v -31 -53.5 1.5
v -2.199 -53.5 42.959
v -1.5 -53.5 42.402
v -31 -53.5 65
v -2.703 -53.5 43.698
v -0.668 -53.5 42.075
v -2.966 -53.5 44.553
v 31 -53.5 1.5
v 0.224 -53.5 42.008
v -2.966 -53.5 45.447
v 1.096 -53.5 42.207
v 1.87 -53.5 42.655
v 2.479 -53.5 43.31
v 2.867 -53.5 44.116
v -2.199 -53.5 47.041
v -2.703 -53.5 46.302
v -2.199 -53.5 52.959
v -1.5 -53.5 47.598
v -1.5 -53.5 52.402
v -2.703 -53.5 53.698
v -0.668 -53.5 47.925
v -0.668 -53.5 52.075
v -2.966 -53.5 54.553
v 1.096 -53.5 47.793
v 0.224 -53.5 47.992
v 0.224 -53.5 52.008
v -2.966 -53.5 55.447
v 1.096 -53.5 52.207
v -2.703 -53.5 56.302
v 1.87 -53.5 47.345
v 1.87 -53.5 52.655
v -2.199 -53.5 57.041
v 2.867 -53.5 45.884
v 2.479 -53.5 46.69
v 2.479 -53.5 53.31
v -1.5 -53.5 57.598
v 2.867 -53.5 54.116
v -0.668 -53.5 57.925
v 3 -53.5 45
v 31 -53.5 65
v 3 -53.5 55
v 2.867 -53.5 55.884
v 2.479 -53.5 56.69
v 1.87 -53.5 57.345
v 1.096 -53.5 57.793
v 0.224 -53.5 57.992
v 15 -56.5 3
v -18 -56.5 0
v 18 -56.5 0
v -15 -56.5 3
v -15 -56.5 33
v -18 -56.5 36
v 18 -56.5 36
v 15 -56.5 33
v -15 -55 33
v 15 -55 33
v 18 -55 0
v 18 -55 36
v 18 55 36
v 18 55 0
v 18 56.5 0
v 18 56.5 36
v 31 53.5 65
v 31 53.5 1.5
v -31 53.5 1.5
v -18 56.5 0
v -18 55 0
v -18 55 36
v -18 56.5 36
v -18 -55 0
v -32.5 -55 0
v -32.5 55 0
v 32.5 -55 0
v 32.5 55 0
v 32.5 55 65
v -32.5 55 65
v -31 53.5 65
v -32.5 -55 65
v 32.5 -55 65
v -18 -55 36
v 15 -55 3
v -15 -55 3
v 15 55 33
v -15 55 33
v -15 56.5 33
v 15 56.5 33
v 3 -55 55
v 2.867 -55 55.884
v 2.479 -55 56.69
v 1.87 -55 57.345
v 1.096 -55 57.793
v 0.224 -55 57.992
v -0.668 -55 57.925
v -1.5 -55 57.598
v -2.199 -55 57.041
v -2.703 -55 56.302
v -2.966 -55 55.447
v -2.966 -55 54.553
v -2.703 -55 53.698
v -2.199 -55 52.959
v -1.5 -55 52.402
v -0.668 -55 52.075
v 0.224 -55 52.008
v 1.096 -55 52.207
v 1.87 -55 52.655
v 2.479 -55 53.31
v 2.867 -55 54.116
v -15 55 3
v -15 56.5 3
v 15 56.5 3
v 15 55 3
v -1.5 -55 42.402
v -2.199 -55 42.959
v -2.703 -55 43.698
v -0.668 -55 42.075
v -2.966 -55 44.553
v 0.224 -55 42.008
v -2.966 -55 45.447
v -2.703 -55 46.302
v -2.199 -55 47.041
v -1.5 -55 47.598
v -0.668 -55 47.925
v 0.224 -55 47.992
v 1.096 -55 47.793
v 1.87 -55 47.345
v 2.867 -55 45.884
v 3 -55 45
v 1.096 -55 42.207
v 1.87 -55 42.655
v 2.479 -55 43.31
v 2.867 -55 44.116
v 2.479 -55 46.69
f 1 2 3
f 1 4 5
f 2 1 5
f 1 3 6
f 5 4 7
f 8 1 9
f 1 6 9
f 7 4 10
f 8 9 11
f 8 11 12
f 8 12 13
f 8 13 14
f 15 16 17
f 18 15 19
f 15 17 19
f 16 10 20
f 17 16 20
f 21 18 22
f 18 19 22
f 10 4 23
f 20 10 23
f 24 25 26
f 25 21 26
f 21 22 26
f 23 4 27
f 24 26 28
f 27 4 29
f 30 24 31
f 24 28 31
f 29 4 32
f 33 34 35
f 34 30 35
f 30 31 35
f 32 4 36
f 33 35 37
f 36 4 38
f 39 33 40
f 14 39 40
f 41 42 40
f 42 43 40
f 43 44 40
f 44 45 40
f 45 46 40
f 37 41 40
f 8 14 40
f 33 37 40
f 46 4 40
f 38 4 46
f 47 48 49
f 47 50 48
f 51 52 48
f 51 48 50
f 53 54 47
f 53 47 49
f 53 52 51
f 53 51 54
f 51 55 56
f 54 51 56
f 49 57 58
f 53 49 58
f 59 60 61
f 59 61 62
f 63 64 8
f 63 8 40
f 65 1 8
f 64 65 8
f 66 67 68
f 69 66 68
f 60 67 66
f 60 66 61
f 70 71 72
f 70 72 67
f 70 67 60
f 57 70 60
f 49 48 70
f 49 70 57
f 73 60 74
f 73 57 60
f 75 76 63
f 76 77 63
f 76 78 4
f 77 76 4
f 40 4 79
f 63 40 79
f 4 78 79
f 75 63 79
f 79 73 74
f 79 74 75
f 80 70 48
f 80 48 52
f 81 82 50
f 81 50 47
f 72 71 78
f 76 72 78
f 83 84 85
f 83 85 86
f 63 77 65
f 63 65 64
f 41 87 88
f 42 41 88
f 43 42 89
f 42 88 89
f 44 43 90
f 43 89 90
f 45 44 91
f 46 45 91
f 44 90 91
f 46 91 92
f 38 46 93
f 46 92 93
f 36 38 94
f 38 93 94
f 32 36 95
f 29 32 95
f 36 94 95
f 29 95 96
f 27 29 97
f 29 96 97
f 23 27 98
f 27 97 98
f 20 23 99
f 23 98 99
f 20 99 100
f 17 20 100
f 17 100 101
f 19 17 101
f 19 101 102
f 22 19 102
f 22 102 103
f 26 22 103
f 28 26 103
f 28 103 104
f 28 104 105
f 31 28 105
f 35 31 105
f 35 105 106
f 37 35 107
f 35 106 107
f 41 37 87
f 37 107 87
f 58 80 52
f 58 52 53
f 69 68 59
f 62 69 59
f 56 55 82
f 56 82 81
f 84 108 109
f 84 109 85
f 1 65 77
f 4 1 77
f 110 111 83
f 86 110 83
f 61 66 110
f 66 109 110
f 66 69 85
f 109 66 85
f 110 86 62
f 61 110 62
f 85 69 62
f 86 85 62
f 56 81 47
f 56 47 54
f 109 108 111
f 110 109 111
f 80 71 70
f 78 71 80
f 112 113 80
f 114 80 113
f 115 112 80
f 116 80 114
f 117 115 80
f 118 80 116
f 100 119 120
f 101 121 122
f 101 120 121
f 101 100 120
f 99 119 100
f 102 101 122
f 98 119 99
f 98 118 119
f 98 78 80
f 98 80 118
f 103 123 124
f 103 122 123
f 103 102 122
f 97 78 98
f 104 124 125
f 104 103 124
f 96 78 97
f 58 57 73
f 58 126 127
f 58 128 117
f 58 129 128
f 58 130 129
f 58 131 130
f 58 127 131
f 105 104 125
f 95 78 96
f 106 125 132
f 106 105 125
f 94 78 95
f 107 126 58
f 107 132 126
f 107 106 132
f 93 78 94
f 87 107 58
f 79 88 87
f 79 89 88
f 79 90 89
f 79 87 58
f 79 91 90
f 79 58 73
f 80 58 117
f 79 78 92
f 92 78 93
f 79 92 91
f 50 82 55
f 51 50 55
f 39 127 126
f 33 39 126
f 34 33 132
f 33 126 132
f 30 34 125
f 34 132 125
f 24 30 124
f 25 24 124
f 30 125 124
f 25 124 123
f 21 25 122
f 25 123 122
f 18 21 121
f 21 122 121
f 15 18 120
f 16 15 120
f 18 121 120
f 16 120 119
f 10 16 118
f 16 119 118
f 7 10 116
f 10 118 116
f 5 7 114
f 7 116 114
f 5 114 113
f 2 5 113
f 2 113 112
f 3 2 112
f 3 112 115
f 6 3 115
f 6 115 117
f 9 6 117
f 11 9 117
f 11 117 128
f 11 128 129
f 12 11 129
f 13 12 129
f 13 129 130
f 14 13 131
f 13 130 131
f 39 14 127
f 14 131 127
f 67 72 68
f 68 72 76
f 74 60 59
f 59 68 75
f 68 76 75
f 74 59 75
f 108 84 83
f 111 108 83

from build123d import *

# Parameters (mm, degrees)
F0_W         = 65
F0_H         = 65
F1_DEPTH     = 55
F2_W         = 36
F2_H         = 36
F2_W_2       = 30
F2_H_2       = 30
F3_DEPTH     = 1.5
F5_T         = 1.5
F5_T3_DEPTH  = 39
F5_T5_DEPTH  = 39
F5_T7_DEPTH  = 4.5
F5_T9_DEPTH  = 33
F5_T11_DEPTH = 33
F5_T13_DEPTH = 4.5
F6_R         = 3
F7_DEPTH     = 1.5


# Not quite as in the source:
# - a shell that OpenCascade refuses in one call is made with other operations: the cavity is built on its own and cut out


with BuildPart() as f1:
    # F0 (on Front) → F1 (new body)
    with BuildSketch(Plane.XZ):
        with Locations((0, 32.5)):
            Rectangle(F0_W, F0_H)
    extrude(amount=F1_DEPTH)

    # F2 (on face) → F3 (join)
    with BuildSketch(Plane.XZ.offset(55)):
        with Locations((0, 18)):
            Rectangle(F2_W, F2_H)
        with Locations((0, 18)):
            Rectangle(F2_W_2, F2_H_2, mode=Mode.SUBTRACT)
    extrude(amount=F3_DEPTH)

    # F4: F1 across plane


with BuildPart() as f1_1:
    add(f1.part)
    add(f1.part.mirror(Plane.XZ))

    # F5: shell of thickness 1.5, made by hand


with BuildPart() as f5_core1:
    # F5_t2: copy of F1
    add(f1_1.part)

    # the walls: a layer under each face that stays
    f5_faces = [f5_core1.faces().sort_by_distance(p)[0] for p in [
        (-21.6666666667, 55, 10.8333333333),
        (-18, 55.75, 18),
        (-15.4285714286, 56.5, 2.5714285714),
        (0, 55.75, 3),
        (0, 55, 18),
        (15, 55.75, 18),
        (0, 55.75, 33),
        (-15, 55.75, 18),
        (0, 55.75, 36),
        (18, 55.75, 18),
        (0, 0, 0),
        (18, -55.75, 18),
        (0, -55.75, 36),
        (-15.4285714286, -56.5, 2.5714285714),
        (0, -55.75, 3),
        (0, -55, 18),
        (15, -55.75, 18),
        (0, -55.75, 33),
        (-15, -55.75, 18),
        (-18, -55.75, 18),
        (-32.5, 0, 32.5),
        (-21.6666666667, -55, 10.8333333333),
        (32.5, 0, 32.5),
    ]]
    thicken(f5_faces, amount=-F5_T, mode=Mode.SUBTRACT)

    # F5_s4 → F5_t3 (cut)
    with BuildSketch(Plane.XY.offset(-1.5)):
        Polygon((18.015, 55.015), (18, 53.5), (16.5, 53.5), (16.5, 55), align=None)
        Polygon((-18.015, 55.015), (-18, 53.5), (-16.5, 53.5), (-16.5, 55), align=None)
        Polygon((18.015, -55.015), (16.5, -55), (16.5, -53.5), (18, -53.5), align=None)
        Polygon((-18.015, -55.015), (-16.5, -55), (-16.5, -53.5), (-18, -53.5), align=None)
    extrude(amount=F5_T3_DEPTH, mode=Mode.SUBTRACT)

    # F5_s6 → F5_t5 (cut)
    with BuildSketch(Plane.YZ.offset(-19.5)):
        Polygon((55.015, 36.015), (53.5, 36), (53.5, 34.5), (55, 34.5), align=None)
        Polygon((-55.015, 36.015), (-55, 34.5), (-53.5, 34.5), (-53.5, 36), align=None)
    extrude(amount=F5_T5_DEPTH, mode=Mode.SUBTRACT)

    # F5_s8 → F5_t7 (cut)
    with BuildSketch(Plane.XZ.offset(-58)):
        Polygon((14.985, 3.015), (15, 1.5), (16.5, 1.5), (16.5, 3), align=None)
        Polygon((-14.985, 3.015), (-15, 1.5), (-16.5, 1.5), (-16.5, 3), align=None)
        Polygon((14.985, 32.985), (16.5, 33), (16.5, 34.5), (15, 34.5), align=None)
        Polygon((-14.985, 32.985), (-15, 34.5), (-16.5, 34.5), (-16.5, 33), align=None)
    extrude(amount=F5_T7_DEPTH, mode=Mode.SUBTRACT)

    # F5_s10 → F5_t9 (cut)
    with BuildSketch(Plane.YZ.offset(-16.5)):
        Polygon((55.015, 3.015), (55, 1.5), (53.5, 1.5), (53.5, 3), align=None)
        Polygon((55.015, 32.985), (53.5, 33), (53.5, 34.5), (55, 34.5), align=None)
        Polygon((-55.015, 3.015), (-55, 1.5), (-53.5, 1.5), (-53.5, 3), align=None)
        Polygon((-55.015, 32.985), (-53.5, 33), (-53.5, 34.5), (-55, 34.5), align=None)
    extrude(amount=F5_T9_DEPTH, mode=Mode.SUBTRACT)

    # F5_s12 → F5_t11 (cut)
    with BuildSketch(Plane.XY.offset(1.5)):
        Polygon((-14.985, 55.015), (-15, 53.5), (-16.5, 53.5), (-16.5, 55), align=None)
        Polygon((14.985, 55.015), (15, 53.5), (16.5, 53.5), (16.5, 55), align=None)
        Polygon((-14.985, -55.015), (-15, -53.5), (-16.5, -53.5), (-16.5, -55), align=None)
        Polygon((14.985, -55.015), (15, -53.5), (16.5, -53.5), (16.5, -55), align=None)
    extrude(amount=F5_T11_DEPTH, mode=Mode.SUBTRACT)

    # F5_s14 → F5_t13 (cut)
    with BuildSketch(Plane.XZ.offset(53.5)):
        Polygon((14.985, 3.015), (15, 1.5), (16.5, 1.5), (16.5, 3), align=None)
        Polygon((-14.985, 3.015), (-15, 1.5), (-16.5, 1.5), (-16.5, 3), align=None)
        Polygon((14.985, 32.985), (16.5, 33), (16.5, 34.5), (15, 34.5), align=None)
        Polygon((-14.985, 32.985), (-15, 34.5), (-16.5, 34.5), (-16.5, 33), align=None)
    extrude(amount=F5_T13_DEPTH, mode=Mode.SUBTRACT)


with BuildPart() as f1_2:
    add(f1_1.part)

    # what is left inside the walls is the cavity
    f5_cavity = [f5_core1.part.solids().sort_by_distance(p)[0] for p in [
        (-30.985, -17.833333, 33.25),
    ]]
    add(f5_cavity, mode=Mode.SUBTRACT)

    # F6 (on face) → F7 (cut, through all)
    with BuildSketch(Plane.XZ.offset(55)):
        with Locations((0, 55)):
            Circle(F6_R)
        with Locations((0, 45)):
            Circle(F6_R)
    extrude(amount=-F7_DEPTH, mode=Mode.SUBTRACT)


solid = f1_2.part
